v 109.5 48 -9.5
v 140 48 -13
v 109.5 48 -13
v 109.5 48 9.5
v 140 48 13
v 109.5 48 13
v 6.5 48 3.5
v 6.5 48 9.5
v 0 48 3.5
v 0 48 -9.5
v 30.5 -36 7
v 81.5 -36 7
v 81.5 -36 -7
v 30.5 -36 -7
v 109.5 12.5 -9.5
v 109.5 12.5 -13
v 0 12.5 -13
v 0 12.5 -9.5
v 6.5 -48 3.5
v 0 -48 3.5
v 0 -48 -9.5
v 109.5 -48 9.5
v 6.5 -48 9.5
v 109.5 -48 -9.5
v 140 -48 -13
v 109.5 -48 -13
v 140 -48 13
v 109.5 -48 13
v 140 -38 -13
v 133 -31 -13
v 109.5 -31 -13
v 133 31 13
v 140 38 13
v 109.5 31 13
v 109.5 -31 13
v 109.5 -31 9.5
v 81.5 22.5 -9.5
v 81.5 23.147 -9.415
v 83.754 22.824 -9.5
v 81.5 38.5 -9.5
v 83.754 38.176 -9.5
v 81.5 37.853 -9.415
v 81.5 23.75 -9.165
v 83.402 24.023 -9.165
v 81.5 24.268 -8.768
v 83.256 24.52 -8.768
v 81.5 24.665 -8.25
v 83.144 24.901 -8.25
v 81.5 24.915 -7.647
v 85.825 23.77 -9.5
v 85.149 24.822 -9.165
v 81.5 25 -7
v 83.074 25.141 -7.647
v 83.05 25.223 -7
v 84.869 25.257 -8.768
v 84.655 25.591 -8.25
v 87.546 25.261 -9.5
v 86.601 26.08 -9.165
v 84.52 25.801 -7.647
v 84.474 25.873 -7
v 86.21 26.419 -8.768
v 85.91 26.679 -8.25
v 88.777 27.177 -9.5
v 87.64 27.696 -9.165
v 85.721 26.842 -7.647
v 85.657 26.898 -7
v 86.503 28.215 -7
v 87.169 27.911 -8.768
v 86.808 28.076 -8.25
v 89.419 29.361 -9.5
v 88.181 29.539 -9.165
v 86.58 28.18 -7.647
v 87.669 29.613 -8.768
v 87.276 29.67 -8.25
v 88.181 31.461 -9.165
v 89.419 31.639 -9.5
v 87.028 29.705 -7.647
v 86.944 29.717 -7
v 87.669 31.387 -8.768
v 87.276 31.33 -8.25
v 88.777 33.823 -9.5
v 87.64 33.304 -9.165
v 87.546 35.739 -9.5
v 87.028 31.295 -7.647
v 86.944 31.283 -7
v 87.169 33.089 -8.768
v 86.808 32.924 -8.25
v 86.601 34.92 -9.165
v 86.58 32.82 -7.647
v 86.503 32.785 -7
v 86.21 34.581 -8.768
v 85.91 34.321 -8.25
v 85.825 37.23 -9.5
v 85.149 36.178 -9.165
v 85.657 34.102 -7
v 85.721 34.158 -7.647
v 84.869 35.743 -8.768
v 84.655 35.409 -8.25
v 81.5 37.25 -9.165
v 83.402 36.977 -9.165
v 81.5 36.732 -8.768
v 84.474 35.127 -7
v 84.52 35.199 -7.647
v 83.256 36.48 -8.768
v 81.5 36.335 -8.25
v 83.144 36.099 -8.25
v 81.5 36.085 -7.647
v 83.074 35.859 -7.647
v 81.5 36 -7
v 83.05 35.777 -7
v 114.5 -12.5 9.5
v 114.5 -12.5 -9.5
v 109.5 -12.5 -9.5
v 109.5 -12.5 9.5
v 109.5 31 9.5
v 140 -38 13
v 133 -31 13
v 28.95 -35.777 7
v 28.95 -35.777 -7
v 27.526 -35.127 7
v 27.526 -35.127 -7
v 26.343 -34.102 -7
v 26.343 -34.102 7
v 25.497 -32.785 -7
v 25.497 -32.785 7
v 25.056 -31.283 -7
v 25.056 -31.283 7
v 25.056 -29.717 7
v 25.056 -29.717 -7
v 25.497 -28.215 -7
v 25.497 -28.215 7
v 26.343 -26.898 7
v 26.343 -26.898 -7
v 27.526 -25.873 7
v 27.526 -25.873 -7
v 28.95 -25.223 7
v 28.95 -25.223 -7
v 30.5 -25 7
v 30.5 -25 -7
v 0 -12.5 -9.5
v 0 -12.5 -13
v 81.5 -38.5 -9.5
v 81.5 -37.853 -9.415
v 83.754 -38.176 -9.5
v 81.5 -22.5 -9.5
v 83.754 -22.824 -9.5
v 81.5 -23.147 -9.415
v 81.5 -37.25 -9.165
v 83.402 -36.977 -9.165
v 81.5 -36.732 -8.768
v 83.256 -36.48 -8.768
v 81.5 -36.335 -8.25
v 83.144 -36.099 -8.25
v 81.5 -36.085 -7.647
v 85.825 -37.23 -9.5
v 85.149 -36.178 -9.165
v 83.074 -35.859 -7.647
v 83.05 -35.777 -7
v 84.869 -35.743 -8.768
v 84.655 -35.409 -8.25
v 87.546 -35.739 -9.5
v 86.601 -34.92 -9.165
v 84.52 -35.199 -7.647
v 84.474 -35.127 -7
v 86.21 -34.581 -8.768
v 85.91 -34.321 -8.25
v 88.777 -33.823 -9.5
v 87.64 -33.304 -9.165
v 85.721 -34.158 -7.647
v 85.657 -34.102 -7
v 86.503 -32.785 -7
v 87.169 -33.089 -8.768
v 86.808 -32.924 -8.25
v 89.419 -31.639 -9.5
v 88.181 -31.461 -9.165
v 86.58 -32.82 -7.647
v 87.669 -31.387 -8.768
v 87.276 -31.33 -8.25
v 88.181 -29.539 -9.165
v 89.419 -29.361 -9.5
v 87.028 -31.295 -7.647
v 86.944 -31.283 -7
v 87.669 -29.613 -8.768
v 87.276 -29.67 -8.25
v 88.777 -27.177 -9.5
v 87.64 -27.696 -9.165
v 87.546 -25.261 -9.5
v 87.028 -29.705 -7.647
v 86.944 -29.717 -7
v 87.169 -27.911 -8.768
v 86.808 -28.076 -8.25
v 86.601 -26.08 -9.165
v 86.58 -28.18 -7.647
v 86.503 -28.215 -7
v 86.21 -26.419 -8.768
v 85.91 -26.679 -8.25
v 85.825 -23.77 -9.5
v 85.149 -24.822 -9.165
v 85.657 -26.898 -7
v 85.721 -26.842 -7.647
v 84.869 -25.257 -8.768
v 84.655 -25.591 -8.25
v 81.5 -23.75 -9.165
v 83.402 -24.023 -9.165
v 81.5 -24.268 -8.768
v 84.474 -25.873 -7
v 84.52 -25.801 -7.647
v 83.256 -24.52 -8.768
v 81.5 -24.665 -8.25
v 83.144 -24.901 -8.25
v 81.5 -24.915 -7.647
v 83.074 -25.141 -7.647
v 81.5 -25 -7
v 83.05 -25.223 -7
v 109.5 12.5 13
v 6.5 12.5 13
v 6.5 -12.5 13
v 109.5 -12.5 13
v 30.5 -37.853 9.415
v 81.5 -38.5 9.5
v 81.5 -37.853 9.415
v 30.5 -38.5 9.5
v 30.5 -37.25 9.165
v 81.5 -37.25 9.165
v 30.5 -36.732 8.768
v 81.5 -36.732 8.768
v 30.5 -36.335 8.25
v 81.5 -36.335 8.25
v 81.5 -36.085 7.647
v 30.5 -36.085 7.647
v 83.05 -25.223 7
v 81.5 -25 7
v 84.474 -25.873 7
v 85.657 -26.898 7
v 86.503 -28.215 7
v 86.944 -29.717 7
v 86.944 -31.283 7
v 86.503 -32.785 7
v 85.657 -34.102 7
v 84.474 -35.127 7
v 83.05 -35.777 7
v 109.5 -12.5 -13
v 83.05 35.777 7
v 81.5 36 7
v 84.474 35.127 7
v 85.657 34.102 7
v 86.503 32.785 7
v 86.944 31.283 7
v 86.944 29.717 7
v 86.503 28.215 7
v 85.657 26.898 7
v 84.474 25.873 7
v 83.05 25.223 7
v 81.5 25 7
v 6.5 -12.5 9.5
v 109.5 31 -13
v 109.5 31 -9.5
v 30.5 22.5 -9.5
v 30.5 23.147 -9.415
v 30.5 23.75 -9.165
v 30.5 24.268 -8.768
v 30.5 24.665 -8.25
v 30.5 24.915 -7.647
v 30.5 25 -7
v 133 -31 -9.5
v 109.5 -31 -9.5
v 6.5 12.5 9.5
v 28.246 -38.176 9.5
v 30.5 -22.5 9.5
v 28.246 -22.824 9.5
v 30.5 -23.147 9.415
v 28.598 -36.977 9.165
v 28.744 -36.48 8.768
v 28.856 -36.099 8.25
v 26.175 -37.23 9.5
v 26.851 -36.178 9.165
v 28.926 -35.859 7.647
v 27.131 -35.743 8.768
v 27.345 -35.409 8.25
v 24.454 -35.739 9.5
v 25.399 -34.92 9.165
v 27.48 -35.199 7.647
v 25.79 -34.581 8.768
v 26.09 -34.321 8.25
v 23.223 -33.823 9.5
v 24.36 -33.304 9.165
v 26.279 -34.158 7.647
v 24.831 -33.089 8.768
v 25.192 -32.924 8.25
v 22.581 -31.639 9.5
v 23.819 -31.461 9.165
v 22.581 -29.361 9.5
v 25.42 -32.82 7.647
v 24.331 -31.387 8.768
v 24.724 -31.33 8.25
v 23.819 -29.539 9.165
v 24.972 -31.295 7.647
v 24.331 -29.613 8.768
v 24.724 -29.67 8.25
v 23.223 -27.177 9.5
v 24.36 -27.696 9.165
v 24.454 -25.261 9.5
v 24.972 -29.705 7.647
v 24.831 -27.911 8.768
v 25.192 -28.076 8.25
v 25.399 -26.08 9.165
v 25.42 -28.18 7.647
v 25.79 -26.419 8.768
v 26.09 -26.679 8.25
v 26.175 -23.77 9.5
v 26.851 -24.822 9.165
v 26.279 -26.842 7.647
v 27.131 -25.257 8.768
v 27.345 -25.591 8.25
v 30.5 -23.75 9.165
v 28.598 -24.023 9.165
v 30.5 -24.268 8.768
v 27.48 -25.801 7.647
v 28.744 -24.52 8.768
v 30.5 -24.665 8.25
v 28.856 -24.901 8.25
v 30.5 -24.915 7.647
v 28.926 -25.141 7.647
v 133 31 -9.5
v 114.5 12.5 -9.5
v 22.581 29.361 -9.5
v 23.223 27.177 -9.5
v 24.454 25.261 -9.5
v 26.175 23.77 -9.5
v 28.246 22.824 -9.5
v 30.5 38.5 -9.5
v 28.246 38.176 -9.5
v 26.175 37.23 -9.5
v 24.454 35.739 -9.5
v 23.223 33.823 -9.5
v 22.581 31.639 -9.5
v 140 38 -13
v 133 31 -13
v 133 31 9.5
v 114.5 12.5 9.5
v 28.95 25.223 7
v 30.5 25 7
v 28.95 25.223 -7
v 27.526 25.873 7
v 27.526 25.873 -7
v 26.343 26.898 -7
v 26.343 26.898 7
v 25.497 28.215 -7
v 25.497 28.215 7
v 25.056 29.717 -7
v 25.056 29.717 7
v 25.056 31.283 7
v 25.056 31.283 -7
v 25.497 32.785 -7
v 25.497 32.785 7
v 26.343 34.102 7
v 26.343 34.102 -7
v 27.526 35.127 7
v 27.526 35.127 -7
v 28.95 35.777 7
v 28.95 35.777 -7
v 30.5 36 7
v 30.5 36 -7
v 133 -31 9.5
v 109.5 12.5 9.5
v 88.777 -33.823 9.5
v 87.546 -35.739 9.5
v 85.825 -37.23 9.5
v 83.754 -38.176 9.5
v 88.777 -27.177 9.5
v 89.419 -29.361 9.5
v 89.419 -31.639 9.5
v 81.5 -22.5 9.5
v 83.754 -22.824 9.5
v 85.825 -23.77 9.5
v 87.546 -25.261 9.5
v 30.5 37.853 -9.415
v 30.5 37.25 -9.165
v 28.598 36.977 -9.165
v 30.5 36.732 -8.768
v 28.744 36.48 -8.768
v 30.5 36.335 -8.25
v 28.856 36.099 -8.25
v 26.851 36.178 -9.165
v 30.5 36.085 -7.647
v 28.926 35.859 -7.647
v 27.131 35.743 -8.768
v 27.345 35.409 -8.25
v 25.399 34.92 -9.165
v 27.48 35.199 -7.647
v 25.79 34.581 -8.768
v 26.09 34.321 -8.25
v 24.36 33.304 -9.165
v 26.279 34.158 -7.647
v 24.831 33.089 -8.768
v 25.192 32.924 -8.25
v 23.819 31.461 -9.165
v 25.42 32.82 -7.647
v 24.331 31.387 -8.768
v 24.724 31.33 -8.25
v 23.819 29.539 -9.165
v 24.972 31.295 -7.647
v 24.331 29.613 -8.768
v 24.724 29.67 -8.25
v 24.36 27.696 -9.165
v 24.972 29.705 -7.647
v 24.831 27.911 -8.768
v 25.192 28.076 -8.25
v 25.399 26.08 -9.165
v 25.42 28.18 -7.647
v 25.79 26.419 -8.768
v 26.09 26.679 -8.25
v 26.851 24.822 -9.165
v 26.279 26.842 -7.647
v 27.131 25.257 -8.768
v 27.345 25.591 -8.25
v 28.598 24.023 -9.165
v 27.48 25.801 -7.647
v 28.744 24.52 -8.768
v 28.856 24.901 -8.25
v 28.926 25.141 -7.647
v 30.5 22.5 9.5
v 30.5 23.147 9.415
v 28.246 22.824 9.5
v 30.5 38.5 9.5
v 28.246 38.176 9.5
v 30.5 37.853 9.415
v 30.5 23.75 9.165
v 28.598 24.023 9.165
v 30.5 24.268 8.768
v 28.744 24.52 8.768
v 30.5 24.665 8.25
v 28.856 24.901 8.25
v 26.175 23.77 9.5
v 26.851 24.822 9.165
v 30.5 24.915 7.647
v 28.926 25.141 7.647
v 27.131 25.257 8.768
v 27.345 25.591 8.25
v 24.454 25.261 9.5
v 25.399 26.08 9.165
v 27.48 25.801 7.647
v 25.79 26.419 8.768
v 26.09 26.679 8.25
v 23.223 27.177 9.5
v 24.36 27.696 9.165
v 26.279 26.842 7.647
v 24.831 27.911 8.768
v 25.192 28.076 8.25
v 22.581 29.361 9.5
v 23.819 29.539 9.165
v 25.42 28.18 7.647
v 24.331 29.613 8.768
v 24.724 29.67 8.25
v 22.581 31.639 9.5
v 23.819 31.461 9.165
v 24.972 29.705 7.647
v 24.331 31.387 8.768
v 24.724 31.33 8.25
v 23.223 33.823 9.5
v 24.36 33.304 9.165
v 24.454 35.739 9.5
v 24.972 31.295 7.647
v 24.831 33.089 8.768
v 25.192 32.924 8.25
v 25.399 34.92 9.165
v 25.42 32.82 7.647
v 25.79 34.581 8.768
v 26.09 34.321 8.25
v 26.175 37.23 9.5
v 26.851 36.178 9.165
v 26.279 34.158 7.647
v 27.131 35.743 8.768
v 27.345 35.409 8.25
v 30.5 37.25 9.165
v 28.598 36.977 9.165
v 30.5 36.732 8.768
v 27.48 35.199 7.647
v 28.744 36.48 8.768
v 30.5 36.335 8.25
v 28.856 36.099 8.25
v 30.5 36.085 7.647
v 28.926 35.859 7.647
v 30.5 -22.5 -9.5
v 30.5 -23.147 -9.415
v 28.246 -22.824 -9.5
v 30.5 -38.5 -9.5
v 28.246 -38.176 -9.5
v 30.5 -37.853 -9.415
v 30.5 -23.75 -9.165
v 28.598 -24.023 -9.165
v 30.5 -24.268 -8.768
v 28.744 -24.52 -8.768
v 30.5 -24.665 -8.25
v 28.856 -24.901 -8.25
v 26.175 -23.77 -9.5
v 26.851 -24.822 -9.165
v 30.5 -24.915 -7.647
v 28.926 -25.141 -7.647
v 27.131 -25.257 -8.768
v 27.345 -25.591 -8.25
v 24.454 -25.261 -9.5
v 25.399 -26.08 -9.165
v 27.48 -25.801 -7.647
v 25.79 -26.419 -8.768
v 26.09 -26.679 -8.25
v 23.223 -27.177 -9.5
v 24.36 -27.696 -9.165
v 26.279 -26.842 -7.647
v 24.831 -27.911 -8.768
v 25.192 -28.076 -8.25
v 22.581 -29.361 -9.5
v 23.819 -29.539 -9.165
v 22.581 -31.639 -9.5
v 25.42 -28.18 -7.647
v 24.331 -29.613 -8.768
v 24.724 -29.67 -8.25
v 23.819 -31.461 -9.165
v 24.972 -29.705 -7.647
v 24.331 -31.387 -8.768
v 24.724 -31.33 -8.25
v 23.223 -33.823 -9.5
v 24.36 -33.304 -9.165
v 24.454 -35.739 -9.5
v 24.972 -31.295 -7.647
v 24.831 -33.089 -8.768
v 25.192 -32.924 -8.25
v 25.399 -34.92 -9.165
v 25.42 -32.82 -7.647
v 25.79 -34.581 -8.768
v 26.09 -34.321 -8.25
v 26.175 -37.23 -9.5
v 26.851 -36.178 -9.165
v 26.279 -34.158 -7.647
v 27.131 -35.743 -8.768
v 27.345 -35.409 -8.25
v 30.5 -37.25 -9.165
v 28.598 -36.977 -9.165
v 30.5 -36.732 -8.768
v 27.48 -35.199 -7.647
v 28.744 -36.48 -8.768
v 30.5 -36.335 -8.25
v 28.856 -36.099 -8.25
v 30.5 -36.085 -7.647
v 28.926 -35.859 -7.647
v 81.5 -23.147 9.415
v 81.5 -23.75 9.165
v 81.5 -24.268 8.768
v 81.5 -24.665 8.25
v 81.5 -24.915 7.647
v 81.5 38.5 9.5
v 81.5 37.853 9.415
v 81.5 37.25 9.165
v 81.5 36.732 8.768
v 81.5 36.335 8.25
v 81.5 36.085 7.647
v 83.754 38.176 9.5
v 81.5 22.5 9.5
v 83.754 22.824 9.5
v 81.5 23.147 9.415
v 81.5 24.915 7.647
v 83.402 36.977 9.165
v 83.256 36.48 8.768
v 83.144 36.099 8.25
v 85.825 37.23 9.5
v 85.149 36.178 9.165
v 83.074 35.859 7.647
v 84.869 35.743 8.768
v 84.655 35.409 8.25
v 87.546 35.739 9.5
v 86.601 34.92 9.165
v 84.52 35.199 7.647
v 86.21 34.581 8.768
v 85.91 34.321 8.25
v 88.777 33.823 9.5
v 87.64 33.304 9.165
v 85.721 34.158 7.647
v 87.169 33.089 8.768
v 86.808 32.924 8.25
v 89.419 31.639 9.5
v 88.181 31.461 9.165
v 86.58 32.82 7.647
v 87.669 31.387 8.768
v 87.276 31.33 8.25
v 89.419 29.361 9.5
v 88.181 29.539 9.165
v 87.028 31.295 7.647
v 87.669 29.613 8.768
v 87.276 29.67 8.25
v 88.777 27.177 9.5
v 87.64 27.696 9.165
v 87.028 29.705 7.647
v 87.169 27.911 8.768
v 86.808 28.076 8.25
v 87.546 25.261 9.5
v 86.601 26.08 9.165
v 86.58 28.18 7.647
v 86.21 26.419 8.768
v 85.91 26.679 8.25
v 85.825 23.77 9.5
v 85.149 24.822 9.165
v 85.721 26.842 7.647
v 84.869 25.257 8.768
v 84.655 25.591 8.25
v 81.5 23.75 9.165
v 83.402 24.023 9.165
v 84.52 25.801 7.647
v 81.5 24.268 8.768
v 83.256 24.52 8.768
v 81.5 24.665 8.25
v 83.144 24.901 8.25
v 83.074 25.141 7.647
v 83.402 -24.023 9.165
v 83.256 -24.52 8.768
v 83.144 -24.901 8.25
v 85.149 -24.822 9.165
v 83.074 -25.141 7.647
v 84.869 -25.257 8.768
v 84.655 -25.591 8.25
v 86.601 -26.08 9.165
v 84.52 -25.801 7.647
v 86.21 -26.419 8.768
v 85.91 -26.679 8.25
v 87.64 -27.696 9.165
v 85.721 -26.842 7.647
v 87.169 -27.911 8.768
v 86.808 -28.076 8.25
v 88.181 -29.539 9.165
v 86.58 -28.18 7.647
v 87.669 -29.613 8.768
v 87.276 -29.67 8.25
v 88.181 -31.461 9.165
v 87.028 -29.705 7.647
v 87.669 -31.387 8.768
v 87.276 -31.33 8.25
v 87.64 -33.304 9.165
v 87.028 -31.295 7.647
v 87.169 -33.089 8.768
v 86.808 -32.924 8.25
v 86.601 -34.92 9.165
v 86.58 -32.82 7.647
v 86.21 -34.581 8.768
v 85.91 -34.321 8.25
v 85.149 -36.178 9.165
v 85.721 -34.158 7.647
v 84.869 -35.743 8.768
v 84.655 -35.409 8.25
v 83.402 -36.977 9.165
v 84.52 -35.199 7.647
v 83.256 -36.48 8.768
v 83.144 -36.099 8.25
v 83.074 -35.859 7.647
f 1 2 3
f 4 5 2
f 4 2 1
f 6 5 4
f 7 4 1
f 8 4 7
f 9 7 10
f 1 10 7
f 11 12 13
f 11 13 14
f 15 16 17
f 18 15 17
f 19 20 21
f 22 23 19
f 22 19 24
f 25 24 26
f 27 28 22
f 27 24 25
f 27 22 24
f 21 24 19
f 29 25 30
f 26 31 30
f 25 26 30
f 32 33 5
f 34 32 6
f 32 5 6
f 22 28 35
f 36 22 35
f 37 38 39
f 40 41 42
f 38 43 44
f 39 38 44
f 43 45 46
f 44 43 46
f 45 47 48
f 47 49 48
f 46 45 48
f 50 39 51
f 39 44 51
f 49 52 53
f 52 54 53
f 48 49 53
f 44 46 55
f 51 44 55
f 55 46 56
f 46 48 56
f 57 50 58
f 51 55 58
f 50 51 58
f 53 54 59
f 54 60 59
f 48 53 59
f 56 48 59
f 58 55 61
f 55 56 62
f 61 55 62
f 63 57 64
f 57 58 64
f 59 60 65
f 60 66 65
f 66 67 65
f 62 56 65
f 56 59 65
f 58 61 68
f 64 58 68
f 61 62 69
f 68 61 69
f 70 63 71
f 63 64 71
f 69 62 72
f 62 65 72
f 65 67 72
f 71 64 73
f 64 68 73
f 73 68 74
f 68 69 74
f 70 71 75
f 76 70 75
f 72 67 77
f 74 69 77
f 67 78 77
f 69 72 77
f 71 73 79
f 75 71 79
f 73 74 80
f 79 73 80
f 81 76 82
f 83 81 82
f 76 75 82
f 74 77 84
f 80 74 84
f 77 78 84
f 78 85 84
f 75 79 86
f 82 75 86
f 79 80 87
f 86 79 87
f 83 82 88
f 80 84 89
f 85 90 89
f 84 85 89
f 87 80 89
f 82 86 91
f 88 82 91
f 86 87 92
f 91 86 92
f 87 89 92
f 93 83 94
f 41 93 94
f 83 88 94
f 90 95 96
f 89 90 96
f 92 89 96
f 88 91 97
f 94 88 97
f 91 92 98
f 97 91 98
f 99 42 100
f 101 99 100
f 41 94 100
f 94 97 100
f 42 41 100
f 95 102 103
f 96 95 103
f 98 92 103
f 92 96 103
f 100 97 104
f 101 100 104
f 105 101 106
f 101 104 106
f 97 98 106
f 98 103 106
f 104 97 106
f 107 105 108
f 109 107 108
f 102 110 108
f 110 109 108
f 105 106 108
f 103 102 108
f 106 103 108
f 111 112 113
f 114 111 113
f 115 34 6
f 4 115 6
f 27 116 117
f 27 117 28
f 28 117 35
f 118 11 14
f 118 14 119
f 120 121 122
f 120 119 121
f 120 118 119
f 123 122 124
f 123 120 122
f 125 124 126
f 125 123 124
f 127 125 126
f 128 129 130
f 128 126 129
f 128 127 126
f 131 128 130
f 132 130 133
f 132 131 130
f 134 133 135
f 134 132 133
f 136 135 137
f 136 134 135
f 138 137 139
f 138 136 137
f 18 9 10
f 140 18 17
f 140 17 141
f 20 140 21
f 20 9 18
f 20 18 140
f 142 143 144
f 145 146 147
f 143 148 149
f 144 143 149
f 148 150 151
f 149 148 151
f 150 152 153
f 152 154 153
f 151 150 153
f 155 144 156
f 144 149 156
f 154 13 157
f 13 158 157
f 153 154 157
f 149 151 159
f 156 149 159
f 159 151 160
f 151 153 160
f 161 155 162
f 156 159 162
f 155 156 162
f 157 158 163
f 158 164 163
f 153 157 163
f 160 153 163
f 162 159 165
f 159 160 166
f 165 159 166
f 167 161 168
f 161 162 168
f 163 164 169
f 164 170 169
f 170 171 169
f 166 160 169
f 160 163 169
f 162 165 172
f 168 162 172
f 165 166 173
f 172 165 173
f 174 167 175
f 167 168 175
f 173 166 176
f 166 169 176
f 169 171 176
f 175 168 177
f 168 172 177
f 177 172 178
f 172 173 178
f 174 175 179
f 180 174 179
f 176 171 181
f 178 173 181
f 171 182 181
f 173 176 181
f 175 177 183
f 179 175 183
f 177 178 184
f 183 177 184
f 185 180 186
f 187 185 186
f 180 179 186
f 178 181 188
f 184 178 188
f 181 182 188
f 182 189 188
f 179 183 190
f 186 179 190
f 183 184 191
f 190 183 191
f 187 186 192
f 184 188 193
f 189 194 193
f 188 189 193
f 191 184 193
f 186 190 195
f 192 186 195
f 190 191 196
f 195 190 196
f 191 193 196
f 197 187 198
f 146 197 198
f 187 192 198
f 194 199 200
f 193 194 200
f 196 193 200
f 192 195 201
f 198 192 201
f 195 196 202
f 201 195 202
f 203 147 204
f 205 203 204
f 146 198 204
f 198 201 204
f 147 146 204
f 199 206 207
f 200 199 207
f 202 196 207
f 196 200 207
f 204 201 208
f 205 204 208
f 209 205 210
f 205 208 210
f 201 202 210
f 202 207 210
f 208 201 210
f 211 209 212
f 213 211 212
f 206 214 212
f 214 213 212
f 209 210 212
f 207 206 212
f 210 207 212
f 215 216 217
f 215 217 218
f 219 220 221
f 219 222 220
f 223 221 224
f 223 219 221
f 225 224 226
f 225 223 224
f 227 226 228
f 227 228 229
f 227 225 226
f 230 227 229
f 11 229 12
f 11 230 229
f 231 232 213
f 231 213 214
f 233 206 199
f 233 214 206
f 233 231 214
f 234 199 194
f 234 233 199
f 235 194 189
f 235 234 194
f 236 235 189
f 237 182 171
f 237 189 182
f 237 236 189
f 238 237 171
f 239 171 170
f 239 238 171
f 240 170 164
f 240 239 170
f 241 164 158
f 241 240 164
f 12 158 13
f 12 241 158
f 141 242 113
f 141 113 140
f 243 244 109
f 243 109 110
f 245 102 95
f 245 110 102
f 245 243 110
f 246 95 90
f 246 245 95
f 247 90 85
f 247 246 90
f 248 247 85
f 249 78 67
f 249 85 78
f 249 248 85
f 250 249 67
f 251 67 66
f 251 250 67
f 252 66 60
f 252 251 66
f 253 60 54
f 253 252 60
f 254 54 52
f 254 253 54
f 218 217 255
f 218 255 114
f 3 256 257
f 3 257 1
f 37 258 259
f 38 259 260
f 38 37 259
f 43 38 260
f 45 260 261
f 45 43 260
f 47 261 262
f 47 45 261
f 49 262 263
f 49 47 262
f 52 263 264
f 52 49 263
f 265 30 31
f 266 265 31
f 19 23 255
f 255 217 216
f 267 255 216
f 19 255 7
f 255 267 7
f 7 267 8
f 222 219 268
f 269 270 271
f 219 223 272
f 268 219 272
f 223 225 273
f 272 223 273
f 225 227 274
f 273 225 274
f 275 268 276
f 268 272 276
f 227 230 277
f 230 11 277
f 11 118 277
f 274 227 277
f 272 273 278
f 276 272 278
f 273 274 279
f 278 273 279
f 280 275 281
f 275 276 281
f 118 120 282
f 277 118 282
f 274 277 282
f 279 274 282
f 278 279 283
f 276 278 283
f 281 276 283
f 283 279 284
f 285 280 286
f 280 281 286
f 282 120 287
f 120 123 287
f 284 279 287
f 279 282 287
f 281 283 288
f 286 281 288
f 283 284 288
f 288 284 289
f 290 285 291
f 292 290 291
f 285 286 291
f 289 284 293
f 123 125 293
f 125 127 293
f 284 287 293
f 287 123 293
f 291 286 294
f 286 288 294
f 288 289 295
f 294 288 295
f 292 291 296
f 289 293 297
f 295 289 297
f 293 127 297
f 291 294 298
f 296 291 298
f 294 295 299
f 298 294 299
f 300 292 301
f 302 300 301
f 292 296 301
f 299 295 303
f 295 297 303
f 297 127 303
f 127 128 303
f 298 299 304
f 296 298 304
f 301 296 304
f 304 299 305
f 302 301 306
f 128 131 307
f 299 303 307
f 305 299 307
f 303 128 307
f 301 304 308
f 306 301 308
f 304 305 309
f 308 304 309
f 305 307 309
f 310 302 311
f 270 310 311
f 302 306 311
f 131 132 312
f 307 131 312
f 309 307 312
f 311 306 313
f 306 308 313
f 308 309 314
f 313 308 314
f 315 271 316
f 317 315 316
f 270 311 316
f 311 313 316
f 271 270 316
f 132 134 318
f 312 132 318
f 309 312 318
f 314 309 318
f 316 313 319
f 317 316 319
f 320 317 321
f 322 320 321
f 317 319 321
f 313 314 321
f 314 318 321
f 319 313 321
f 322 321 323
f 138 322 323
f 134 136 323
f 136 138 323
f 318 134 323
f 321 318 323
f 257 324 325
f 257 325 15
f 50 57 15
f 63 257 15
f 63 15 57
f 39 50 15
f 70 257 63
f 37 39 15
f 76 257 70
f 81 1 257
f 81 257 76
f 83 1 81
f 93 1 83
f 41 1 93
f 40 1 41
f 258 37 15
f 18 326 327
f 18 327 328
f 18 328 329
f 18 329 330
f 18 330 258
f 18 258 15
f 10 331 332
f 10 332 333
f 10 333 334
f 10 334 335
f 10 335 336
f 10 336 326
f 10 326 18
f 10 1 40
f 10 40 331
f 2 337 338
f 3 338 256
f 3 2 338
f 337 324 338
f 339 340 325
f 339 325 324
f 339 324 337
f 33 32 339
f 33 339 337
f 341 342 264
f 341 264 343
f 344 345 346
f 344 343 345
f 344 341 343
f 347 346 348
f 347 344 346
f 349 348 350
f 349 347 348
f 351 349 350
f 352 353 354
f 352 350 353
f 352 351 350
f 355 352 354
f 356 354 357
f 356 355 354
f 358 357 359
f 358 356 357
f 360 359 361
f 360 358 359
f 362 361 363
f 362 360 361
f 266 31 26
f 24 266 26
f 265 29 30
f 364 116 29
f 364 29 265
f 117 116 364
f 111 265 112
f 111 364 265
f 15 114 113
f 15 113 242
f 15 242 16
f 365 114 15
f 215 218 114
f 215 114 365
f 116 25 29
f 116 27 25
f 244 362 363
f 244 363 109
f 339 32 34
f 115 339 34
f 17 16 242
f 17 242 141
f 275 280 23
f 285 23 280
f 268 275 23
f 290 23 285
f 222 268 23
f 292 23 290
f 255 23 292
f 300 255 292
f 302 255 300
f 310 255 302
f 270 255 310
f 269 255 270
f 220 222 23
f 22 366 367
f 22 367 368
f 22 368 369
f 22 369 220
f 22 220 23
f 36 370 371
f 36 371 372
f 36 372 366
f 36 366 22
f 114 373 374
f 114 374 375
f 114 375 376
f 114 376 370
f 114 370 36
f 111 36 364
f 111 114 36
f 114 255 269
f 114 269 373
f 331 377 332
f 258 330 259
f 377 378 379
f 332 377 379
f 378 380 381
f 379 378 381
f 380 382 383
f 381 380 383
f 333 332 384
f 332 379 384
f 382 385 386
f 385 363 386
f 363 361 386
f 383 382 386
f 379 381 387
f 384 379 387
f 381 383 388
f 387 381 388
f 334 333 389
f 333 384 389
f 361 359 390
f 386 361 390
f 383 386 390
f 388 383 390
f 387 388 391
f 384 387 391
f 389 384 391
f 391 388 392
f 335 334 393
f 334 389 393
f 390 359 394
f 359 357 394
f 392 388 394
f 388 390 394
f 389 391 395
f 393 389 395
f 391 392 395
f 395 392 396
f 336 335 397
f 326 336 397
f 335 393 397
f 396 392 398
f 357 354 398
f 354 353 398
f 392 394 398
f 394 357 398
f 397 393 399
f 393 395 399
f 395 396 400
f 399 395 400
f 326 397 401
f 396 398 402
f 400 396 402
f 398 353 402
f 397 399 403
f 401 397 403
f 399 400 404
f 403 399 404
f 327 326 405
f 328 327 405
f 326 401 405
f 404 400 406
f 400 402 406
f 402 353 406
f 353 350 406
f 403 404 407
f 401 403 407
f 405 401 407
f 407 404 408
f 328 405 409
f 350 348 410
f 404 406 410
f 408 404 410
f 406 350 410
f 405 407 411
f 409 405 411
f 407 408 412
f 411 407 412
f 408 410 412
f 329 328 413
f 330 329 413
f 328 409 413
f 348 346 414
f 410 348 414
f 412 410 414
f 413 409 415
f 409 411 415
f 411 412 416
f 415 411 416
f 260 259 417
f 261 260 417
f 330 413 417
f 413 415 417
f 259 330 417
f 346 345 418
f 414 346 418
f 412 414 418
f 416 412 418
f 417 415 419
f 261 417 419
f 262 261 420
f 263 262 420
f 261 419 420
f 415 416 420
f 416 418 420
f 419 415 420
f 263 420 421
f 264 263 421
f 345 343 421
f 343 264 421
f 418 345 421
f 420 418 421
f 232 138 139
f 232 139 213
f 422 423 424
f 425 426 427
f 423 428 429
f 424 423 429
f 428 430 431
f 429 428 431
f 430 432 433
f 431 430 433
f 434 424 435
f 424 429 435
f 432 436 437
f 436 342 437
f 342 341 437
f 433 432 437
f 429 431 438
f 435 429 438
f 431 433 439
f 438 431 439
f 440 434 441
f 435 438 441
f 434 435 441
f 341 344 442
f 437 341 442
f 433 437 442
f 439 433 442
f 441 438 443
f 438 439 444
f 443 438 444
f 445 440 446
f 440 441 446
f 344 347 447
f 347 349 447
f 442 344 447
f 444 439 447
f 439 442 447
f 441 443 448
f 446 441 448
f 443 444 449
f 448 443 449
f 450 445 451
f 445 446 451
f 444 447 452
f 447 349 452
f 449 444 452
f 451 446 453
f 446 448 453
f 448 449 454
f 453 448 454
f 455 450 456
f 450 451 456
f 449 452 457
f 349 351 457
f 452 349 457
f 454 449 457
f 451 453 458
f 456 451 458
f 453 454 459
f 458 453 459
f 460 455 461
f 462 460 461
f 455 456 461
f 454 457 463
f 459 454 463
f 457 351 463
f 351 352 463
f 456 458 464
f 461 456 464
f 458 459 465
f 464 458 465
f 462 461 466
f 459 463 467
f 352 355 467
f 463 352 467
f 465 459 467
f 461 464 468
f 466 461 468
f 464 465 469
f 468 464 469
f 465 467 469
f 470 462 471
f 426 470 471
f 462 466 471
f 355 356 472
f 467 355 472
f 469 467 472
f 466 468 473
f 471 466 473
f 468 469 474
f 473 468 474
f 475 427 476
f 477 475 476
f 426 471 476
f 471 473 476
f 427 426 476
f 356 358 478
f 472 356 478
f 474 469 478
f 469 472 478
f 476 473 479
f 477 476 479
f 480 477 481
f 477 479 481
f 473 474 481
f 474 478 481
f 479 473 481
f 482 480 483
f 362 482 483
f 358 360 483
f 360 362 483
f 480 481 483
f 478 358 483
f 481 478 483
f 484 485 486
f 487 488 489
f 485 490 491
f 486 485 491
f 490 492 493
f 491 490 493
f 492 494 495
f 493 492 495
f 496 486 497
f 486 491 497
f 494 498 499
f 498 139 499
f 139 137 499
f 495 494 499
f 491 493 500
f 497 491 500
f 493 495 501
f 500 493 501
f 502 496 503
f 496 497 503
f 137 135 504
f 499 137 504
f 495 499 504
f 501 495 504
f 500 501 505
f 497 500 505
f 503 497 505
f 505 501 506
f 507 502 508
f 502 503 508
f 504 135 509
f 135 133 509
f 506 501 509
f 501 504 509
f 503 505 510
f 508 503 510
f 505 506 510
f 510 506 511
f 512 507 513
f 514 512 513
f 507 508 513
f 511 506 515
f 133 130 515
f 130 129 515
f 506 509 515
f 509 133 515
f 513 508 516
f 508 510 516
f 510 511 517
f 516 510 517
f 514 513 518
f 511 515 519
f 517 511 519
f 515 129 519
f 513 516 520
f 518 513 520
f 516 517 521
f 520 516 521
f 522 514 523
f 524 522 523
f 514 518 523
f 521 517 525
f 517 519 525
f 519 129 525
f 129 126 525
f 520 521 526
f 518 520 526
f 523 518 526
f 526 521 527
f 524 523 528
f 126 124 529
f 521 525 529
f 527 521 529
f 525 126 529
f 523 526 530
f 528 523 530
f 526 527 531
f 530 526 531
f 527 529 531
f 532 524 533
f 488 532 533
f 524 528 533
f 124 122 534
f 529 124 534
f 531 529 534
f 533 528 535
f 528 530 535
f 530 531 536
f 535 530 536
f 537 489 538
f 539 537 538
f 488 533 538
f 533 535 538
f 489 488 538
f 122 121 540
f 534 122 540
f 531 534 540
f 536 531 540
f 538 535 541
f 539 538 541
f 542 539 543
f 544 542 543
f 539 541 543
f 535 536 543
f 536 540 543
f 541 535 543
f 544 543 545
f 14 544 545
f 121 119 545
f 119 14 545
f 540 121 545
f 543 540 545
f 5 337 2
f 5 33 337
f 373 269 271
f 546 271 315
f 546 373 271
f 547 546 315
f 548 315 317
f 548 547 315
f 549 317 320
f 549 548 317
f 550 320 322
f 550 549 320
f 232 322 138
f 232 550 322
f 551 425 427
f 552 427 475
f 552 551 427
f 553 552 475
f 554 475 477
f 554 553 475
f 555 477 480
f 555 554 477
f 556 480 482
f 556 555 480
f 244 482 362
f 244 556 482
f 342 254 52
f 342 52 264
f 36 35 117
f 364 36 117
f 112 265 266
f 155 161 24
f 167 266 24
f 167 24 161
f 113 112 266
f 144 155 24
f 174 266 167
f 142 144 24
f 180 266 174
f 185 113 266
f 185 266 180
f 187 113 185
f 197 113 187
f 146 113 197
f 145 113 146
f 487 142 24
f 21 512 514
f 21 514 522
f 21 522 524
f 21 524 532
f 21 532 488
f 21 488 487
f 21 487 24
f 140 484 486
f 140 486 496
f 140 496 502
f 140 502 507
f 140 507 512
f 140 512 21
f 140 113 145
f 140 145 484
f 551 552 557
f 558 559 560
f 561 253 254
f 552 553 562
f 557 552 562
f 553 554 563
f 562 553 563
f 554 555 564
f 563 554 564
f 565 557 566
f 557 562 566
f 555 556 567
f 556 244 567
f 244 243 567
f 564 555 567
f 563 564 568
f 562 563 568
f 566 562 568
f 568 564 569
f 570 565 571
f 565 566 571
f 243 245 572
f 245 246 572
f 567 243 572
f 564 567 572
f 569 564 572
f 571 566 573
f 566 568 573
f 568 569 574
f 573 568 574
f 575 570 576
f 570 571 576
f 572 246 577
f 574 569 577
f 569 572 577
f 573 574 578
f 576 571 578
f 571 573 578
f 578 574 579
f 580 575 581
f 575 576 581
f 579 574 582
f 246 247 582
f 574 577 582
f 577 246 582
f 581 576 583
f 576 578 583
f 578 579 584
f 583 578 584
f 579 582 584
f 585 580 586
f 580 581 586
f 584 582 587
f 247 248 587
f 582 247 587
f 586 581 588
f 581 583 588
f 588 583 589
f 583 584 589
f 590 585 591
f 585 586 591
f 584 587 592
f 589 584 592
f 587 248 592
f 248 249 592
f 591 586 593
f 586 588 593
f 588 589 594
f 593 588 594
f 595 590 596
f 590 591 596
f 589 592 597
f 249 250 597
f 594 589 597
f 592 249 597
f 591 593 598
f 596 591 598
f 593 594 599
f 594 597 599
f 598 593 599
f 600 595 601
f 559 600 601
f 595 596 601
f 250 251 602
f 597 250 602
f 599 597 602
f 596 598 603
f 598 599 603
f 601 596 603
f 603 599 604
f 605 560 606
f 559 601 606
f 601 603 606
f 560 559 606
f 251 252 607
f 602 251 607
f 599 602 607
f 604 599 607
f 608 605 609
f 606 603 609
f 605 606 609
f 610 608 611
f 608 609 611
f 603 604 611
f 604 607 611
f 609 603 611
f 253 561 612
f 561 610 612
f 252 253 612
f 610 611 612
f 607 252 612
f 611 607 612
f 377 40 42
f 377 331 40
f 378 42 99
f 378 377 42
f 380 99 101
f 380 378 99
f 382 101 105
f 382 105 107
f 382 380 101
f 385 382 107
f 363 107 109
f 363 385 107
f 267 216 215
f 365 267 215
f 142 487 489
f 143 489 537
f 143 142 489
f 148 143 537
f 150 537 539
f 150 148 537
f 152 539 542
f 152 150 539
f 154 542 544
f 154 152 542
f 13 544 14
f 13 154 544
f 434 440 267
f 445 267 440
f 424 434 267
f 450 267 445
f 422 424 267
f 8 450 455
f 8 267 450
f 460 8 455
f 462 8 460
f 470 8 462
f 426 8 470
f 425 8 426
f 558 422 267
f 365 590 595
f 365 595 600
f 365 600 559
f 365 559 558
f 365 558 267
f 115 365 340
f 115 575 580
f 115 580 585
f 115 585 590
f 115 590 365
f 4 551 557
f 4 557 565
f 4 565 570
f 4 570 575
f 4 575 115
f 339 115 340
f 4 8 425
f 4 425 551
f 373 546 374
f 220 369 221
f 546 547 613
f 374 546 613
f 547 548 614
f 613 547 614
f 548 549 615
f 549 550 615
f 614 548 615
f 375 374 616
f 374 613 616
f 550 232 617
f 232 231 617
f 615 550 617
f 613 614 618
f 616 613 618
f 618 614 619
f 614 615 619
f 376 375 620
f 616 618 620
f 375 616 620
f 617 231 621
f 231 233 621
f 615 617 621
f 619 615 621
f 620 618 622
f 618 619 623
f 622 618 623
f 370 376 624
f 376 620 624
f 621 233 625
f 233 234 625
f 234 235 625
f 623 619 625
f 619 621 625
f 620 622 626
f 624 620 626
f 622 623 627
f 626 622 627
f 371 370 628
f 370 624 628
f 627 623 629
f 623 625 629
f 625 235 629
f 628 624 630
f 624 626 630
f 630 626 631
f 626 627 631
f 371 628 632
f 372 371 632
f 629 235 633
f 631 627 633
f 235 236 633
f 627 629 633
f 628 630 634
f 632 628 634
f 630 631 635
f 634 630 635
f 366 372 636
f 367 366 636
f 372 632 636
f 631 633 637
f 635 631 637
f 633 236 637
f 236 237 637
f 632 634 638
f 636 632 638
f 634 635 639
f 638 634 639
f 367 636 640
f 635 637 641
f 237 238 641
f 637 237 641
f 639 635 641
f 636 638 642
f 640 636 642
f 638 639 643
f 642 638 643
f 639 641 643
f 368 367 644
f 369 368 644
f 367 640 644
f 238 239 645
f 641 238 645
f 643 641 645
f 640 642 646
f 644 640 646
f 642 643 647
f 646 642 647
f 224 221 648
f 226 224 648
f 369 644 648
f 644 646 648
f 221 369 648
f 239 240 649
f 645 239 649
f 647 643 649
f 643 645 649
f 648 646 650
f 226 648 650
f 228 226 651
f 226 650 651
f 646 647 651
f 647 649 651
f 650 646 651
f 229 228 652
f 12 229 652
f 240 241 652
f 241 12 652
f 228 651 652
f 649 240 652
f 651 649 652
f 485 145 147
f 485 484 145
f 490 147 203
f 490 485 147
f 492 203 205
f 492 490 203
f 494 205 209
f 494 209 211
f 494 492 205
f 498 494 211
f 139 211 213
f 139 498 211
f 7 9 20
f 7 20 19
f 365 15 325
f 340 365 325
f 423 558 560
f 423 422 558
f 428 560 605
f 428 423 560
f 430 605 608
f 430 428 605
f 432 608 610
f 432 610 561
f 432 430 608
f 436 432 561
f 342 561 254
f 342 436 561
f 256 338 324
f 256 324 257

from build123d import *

# Parameters (mm, degrees)
SKETCH1_W           = 109.5
SKETCH1_H           = 25
BOSS_EXTRUDE3_DEPTH = 9.5
BOSS_EXTRUDE4_DEPTH = 3.5
BOSS_EXTRUDE5_DEPTH = 3.5
BOSS_EXTRUDE6_DEPTH = 3.5
BOSS_EXTRUDE7_DEPTH = 3.5
SKETCH13_W          = 109.5
SKETCH13_H          = 25
BOSS_EXTRUDE8_DEPTH = 3.5
SKETCH14_W          = 109.5
SKETCH14_H          = 25
BOSS_EXTRUDE9_DEPTH = 3.5
CUT_EXTRUDE1_DEPTH  = 44
FILLET1_R           = 2.5
SKETCH16_W          = 6.5
SKETCH16_H          = 96
CUT_EXTRUDE2_DEPTH  = 11.5


with BuildPart() as part:
    # Sketch1 → Boss-Extrude3 (new, symmetric)
    # profile 1 of 7: a face of its own
    with BuildSketch(Plane.XY):
        Polygon((104.5, 31), (104.5, 48), (0, 48), (0, 12.5), (109.5, 12.5), (114.5, 12.5), (133, 31), align=None)
        with BuildLine():
            ThreePointArc((30.5, 25), (25, 30.5), (30.5, 36))
            Line((30.5, 36), (81.5, 36))
            ThreePointArc((81.5, 36), (87, 30.5), (81.5, 25))
            Line((81.5, 25), (30.5, 25))
        make_face(mode=Mode.SUBTRACT)
    # profile 2 of 7: a face of its own
    with BuildSketch(Plane.XY):
        with BuildLine():
            Line((30.5, 25), (81.5, 25))
            ThreePointArc((81.5, 25), (87, 30.5), (81.5, 36))
            Line((81.5, 36), (30.5, 36))
            ThreePointArc((30.5, 36), (25, 30.5), (30.5, 25))
        make_face()
    # profile 3 of 7: a face of its own
    with BuildSketch(Plane.XY):
        Polygon((140, 38), (140, 48), (104.5, 48), (104.5, 31), (133, 31), align=None)
    # profile 4 of 7: a face of its own
    with BuildSketch(Plane.XY):
        with Locations((54.75, 0)):
            Rectangle(SKETCH1_W, SKETCH1_H)
    # profile 5 of 7: a face of its own
    with BuildSketch(Plane.XY):
        Polygon((104.5, -31), (104.5, -48), (140, -48), (140, -38), (133, -31), align=None)
    # profile 6 of 7: a face of its own
    with BuildSketch(Plane.XY):
        Polygon((109.5, -12.5), (0, -12.5), (0, -48), (104.5, -48), (104.5, -31), (133, -31), (114.5, -12.5), align=None)
        with BuildLine():
            Line((81.5, -36), (30.5, -36))
            ThreePointArc((30.5, -36), (25, -30.5), (30.5, -25))
            Line((30.5, -25), (81.5, -25))
            ThreePointArc((81.5, -25), (87, -30.5), (81.5, -36))
        make_face(mode=Mode.SUBTRACT)
    # profile 7 of 7: a face of its own
    with BuildSketch(Plane.XY):
        with BuildLine():
            ThreePointArc((81.5, -25), (87, -30.5), (81.5, -36))
            Line((81.5, -36), (30.5, -36))
            ThreePointArc((30.5, -36), (25, -30.5), (30.5, -25))
            Line((30.5, -25), (81.5, -25))
        make_face()
    extrude(amount=BOSS_EXTRUDE3_DEPTH, both=True)

    # Sketch9 → Boss-Extrude4 (add, symmetric)
    with BuildSketch(Plane.XY.offset(9.5)):
        Polygon((140, 48), (140, 38), (133, 31), (109.5, 31), (109.5, 48), align=None)
    extrude(amount=BOSS_EXTRUDE4_DEPTH, both=True)

    # Sketch10 → Boss-Extrude5 (add, symmetric)
    with BuildSketch(Plane(origin=(0, 0, -9.5), x_dir=(-1, 0, 0), z_dir=(0, 0, -1))):
        Polygon((-109.5, 48), (-140, 48), (-140, 38), (-133, 31), (-109.5, 31), align=None)
    extrude(amount=BOSS_EXTRUDE5_DEPTH, both=True)

    # Sketch11 → Boss-Extrude6 (add, symmetric)
    with BuildSketch(Plane.XY.offset(9.5)):
        Polygon((140, -38), (140, -48), (109.5, -48), (109.5, -31), (133, -31), align=None)
    extrude(amount=BOSS_EXTRUDE6_DEPTH, both=True)

    # Sketch12 → Boss-Extrude7 (add, symmetric)
    with BuildSketch(Plane(origin=(0, 0, -9.5), x_dir=(-1, 0, 0), z_dir=(0, 0, -1))):
        Polygon((-140, -48), (-140, -38), (-133, -31), (-109.5, -31), (-109.5, -48), align=None)
    extrude(amount=BOSS_EXTRUDE7_DEPTH, both=True)

    # Sketch13 → Boss-Extrude8 (add, symmetric)
    with BuildSketch(Plane.XY.offset(9.5)):
        with Locations((54.75, 0)):
            Rectangle(SKETCH13_W, SKETCH13_H)
    extrude(amount=BOSS_EXTRUDE8_DEPTH, both=True)

    # Sketch14 → Boss-Extrude9 (add, symmetric)
    with BuildSketch(Plane(origin=(0, 0, -9.5), x_dir=(-1, 0, 0), z_dir=(0, 0, -1))):
        with Locations((-54.75, 0)):
            Rectangle(SKETCH14_W, SKETCH14_H)
    extrude(amount=BOSS_EXTRUDE9_DEPTH, both=True)

    # Sketch15 → Cut-Extrude1 (cut)
    with BuildSketch(Plane.XY.offset(9.5)):
        with BuildLine():
            Line((30.5, 36), (81.5, 36))
            ThreePointArc((81.5, 36), (87, 30.5), (81.5, 25))
            Line((81.5, 25), (30.5, 25))
            ThreePointArc((30.5, 25), (25, 30.5), (30.5, 36))
        make_face()
        with BuildLine():
            Line((30.5, -25), (81.5, -25))
            ThreePointArc((81.5, -25), (87, -30.5), (81.5, -36))
            Line((81.5, -36), (30.5, -36))
            ThreePointArc((30.5, -36), (25, -30.5), (30.5, -25))
        make_face()
    extrude(amount=-CUT_EXTRUDE1_DEPTH, mode=Mode.SUBTRACT)

    # Fillet1
    fillet1_edges = [part.edges().sort_by_distance(p)[0] for p in [
        (25, 30.5, -9.5),
        (56, 36, -9.5),
        (87, 30.5, -9.5),
        (56, 25, -9.5),
        (25, 30.5, 9.5),
        (56, 25, 9.5),
        (87, 30.5, 9.5),
        (56, 36, 9.5),
        (25, -30.5, -9.5),
        (56, -25, -9.5),
        (87, -30.5, -9.5),
        (56, -36, -9.5),
        (25, -30.5, 9.5),
        (56, -36, 9.5),
        (87, -30.5, 9.5),
        (56, -25, 9.5),
    ]]
    fillet(fillet1_edges, radius=FILLET1_R)

    # Sketch16 → Cut-Extrude2 (cut)
    with BuildSketch(Plane.XY.offset(15)):
        with Locations((3.25, 0)):
            Rectangle(SKETCH16_W, SKETCH16_H)
    extrude(amount=-CUT_EXTRUDE2_DEPTH, mode=Mode.SUBTRACT)


solid = part.part
